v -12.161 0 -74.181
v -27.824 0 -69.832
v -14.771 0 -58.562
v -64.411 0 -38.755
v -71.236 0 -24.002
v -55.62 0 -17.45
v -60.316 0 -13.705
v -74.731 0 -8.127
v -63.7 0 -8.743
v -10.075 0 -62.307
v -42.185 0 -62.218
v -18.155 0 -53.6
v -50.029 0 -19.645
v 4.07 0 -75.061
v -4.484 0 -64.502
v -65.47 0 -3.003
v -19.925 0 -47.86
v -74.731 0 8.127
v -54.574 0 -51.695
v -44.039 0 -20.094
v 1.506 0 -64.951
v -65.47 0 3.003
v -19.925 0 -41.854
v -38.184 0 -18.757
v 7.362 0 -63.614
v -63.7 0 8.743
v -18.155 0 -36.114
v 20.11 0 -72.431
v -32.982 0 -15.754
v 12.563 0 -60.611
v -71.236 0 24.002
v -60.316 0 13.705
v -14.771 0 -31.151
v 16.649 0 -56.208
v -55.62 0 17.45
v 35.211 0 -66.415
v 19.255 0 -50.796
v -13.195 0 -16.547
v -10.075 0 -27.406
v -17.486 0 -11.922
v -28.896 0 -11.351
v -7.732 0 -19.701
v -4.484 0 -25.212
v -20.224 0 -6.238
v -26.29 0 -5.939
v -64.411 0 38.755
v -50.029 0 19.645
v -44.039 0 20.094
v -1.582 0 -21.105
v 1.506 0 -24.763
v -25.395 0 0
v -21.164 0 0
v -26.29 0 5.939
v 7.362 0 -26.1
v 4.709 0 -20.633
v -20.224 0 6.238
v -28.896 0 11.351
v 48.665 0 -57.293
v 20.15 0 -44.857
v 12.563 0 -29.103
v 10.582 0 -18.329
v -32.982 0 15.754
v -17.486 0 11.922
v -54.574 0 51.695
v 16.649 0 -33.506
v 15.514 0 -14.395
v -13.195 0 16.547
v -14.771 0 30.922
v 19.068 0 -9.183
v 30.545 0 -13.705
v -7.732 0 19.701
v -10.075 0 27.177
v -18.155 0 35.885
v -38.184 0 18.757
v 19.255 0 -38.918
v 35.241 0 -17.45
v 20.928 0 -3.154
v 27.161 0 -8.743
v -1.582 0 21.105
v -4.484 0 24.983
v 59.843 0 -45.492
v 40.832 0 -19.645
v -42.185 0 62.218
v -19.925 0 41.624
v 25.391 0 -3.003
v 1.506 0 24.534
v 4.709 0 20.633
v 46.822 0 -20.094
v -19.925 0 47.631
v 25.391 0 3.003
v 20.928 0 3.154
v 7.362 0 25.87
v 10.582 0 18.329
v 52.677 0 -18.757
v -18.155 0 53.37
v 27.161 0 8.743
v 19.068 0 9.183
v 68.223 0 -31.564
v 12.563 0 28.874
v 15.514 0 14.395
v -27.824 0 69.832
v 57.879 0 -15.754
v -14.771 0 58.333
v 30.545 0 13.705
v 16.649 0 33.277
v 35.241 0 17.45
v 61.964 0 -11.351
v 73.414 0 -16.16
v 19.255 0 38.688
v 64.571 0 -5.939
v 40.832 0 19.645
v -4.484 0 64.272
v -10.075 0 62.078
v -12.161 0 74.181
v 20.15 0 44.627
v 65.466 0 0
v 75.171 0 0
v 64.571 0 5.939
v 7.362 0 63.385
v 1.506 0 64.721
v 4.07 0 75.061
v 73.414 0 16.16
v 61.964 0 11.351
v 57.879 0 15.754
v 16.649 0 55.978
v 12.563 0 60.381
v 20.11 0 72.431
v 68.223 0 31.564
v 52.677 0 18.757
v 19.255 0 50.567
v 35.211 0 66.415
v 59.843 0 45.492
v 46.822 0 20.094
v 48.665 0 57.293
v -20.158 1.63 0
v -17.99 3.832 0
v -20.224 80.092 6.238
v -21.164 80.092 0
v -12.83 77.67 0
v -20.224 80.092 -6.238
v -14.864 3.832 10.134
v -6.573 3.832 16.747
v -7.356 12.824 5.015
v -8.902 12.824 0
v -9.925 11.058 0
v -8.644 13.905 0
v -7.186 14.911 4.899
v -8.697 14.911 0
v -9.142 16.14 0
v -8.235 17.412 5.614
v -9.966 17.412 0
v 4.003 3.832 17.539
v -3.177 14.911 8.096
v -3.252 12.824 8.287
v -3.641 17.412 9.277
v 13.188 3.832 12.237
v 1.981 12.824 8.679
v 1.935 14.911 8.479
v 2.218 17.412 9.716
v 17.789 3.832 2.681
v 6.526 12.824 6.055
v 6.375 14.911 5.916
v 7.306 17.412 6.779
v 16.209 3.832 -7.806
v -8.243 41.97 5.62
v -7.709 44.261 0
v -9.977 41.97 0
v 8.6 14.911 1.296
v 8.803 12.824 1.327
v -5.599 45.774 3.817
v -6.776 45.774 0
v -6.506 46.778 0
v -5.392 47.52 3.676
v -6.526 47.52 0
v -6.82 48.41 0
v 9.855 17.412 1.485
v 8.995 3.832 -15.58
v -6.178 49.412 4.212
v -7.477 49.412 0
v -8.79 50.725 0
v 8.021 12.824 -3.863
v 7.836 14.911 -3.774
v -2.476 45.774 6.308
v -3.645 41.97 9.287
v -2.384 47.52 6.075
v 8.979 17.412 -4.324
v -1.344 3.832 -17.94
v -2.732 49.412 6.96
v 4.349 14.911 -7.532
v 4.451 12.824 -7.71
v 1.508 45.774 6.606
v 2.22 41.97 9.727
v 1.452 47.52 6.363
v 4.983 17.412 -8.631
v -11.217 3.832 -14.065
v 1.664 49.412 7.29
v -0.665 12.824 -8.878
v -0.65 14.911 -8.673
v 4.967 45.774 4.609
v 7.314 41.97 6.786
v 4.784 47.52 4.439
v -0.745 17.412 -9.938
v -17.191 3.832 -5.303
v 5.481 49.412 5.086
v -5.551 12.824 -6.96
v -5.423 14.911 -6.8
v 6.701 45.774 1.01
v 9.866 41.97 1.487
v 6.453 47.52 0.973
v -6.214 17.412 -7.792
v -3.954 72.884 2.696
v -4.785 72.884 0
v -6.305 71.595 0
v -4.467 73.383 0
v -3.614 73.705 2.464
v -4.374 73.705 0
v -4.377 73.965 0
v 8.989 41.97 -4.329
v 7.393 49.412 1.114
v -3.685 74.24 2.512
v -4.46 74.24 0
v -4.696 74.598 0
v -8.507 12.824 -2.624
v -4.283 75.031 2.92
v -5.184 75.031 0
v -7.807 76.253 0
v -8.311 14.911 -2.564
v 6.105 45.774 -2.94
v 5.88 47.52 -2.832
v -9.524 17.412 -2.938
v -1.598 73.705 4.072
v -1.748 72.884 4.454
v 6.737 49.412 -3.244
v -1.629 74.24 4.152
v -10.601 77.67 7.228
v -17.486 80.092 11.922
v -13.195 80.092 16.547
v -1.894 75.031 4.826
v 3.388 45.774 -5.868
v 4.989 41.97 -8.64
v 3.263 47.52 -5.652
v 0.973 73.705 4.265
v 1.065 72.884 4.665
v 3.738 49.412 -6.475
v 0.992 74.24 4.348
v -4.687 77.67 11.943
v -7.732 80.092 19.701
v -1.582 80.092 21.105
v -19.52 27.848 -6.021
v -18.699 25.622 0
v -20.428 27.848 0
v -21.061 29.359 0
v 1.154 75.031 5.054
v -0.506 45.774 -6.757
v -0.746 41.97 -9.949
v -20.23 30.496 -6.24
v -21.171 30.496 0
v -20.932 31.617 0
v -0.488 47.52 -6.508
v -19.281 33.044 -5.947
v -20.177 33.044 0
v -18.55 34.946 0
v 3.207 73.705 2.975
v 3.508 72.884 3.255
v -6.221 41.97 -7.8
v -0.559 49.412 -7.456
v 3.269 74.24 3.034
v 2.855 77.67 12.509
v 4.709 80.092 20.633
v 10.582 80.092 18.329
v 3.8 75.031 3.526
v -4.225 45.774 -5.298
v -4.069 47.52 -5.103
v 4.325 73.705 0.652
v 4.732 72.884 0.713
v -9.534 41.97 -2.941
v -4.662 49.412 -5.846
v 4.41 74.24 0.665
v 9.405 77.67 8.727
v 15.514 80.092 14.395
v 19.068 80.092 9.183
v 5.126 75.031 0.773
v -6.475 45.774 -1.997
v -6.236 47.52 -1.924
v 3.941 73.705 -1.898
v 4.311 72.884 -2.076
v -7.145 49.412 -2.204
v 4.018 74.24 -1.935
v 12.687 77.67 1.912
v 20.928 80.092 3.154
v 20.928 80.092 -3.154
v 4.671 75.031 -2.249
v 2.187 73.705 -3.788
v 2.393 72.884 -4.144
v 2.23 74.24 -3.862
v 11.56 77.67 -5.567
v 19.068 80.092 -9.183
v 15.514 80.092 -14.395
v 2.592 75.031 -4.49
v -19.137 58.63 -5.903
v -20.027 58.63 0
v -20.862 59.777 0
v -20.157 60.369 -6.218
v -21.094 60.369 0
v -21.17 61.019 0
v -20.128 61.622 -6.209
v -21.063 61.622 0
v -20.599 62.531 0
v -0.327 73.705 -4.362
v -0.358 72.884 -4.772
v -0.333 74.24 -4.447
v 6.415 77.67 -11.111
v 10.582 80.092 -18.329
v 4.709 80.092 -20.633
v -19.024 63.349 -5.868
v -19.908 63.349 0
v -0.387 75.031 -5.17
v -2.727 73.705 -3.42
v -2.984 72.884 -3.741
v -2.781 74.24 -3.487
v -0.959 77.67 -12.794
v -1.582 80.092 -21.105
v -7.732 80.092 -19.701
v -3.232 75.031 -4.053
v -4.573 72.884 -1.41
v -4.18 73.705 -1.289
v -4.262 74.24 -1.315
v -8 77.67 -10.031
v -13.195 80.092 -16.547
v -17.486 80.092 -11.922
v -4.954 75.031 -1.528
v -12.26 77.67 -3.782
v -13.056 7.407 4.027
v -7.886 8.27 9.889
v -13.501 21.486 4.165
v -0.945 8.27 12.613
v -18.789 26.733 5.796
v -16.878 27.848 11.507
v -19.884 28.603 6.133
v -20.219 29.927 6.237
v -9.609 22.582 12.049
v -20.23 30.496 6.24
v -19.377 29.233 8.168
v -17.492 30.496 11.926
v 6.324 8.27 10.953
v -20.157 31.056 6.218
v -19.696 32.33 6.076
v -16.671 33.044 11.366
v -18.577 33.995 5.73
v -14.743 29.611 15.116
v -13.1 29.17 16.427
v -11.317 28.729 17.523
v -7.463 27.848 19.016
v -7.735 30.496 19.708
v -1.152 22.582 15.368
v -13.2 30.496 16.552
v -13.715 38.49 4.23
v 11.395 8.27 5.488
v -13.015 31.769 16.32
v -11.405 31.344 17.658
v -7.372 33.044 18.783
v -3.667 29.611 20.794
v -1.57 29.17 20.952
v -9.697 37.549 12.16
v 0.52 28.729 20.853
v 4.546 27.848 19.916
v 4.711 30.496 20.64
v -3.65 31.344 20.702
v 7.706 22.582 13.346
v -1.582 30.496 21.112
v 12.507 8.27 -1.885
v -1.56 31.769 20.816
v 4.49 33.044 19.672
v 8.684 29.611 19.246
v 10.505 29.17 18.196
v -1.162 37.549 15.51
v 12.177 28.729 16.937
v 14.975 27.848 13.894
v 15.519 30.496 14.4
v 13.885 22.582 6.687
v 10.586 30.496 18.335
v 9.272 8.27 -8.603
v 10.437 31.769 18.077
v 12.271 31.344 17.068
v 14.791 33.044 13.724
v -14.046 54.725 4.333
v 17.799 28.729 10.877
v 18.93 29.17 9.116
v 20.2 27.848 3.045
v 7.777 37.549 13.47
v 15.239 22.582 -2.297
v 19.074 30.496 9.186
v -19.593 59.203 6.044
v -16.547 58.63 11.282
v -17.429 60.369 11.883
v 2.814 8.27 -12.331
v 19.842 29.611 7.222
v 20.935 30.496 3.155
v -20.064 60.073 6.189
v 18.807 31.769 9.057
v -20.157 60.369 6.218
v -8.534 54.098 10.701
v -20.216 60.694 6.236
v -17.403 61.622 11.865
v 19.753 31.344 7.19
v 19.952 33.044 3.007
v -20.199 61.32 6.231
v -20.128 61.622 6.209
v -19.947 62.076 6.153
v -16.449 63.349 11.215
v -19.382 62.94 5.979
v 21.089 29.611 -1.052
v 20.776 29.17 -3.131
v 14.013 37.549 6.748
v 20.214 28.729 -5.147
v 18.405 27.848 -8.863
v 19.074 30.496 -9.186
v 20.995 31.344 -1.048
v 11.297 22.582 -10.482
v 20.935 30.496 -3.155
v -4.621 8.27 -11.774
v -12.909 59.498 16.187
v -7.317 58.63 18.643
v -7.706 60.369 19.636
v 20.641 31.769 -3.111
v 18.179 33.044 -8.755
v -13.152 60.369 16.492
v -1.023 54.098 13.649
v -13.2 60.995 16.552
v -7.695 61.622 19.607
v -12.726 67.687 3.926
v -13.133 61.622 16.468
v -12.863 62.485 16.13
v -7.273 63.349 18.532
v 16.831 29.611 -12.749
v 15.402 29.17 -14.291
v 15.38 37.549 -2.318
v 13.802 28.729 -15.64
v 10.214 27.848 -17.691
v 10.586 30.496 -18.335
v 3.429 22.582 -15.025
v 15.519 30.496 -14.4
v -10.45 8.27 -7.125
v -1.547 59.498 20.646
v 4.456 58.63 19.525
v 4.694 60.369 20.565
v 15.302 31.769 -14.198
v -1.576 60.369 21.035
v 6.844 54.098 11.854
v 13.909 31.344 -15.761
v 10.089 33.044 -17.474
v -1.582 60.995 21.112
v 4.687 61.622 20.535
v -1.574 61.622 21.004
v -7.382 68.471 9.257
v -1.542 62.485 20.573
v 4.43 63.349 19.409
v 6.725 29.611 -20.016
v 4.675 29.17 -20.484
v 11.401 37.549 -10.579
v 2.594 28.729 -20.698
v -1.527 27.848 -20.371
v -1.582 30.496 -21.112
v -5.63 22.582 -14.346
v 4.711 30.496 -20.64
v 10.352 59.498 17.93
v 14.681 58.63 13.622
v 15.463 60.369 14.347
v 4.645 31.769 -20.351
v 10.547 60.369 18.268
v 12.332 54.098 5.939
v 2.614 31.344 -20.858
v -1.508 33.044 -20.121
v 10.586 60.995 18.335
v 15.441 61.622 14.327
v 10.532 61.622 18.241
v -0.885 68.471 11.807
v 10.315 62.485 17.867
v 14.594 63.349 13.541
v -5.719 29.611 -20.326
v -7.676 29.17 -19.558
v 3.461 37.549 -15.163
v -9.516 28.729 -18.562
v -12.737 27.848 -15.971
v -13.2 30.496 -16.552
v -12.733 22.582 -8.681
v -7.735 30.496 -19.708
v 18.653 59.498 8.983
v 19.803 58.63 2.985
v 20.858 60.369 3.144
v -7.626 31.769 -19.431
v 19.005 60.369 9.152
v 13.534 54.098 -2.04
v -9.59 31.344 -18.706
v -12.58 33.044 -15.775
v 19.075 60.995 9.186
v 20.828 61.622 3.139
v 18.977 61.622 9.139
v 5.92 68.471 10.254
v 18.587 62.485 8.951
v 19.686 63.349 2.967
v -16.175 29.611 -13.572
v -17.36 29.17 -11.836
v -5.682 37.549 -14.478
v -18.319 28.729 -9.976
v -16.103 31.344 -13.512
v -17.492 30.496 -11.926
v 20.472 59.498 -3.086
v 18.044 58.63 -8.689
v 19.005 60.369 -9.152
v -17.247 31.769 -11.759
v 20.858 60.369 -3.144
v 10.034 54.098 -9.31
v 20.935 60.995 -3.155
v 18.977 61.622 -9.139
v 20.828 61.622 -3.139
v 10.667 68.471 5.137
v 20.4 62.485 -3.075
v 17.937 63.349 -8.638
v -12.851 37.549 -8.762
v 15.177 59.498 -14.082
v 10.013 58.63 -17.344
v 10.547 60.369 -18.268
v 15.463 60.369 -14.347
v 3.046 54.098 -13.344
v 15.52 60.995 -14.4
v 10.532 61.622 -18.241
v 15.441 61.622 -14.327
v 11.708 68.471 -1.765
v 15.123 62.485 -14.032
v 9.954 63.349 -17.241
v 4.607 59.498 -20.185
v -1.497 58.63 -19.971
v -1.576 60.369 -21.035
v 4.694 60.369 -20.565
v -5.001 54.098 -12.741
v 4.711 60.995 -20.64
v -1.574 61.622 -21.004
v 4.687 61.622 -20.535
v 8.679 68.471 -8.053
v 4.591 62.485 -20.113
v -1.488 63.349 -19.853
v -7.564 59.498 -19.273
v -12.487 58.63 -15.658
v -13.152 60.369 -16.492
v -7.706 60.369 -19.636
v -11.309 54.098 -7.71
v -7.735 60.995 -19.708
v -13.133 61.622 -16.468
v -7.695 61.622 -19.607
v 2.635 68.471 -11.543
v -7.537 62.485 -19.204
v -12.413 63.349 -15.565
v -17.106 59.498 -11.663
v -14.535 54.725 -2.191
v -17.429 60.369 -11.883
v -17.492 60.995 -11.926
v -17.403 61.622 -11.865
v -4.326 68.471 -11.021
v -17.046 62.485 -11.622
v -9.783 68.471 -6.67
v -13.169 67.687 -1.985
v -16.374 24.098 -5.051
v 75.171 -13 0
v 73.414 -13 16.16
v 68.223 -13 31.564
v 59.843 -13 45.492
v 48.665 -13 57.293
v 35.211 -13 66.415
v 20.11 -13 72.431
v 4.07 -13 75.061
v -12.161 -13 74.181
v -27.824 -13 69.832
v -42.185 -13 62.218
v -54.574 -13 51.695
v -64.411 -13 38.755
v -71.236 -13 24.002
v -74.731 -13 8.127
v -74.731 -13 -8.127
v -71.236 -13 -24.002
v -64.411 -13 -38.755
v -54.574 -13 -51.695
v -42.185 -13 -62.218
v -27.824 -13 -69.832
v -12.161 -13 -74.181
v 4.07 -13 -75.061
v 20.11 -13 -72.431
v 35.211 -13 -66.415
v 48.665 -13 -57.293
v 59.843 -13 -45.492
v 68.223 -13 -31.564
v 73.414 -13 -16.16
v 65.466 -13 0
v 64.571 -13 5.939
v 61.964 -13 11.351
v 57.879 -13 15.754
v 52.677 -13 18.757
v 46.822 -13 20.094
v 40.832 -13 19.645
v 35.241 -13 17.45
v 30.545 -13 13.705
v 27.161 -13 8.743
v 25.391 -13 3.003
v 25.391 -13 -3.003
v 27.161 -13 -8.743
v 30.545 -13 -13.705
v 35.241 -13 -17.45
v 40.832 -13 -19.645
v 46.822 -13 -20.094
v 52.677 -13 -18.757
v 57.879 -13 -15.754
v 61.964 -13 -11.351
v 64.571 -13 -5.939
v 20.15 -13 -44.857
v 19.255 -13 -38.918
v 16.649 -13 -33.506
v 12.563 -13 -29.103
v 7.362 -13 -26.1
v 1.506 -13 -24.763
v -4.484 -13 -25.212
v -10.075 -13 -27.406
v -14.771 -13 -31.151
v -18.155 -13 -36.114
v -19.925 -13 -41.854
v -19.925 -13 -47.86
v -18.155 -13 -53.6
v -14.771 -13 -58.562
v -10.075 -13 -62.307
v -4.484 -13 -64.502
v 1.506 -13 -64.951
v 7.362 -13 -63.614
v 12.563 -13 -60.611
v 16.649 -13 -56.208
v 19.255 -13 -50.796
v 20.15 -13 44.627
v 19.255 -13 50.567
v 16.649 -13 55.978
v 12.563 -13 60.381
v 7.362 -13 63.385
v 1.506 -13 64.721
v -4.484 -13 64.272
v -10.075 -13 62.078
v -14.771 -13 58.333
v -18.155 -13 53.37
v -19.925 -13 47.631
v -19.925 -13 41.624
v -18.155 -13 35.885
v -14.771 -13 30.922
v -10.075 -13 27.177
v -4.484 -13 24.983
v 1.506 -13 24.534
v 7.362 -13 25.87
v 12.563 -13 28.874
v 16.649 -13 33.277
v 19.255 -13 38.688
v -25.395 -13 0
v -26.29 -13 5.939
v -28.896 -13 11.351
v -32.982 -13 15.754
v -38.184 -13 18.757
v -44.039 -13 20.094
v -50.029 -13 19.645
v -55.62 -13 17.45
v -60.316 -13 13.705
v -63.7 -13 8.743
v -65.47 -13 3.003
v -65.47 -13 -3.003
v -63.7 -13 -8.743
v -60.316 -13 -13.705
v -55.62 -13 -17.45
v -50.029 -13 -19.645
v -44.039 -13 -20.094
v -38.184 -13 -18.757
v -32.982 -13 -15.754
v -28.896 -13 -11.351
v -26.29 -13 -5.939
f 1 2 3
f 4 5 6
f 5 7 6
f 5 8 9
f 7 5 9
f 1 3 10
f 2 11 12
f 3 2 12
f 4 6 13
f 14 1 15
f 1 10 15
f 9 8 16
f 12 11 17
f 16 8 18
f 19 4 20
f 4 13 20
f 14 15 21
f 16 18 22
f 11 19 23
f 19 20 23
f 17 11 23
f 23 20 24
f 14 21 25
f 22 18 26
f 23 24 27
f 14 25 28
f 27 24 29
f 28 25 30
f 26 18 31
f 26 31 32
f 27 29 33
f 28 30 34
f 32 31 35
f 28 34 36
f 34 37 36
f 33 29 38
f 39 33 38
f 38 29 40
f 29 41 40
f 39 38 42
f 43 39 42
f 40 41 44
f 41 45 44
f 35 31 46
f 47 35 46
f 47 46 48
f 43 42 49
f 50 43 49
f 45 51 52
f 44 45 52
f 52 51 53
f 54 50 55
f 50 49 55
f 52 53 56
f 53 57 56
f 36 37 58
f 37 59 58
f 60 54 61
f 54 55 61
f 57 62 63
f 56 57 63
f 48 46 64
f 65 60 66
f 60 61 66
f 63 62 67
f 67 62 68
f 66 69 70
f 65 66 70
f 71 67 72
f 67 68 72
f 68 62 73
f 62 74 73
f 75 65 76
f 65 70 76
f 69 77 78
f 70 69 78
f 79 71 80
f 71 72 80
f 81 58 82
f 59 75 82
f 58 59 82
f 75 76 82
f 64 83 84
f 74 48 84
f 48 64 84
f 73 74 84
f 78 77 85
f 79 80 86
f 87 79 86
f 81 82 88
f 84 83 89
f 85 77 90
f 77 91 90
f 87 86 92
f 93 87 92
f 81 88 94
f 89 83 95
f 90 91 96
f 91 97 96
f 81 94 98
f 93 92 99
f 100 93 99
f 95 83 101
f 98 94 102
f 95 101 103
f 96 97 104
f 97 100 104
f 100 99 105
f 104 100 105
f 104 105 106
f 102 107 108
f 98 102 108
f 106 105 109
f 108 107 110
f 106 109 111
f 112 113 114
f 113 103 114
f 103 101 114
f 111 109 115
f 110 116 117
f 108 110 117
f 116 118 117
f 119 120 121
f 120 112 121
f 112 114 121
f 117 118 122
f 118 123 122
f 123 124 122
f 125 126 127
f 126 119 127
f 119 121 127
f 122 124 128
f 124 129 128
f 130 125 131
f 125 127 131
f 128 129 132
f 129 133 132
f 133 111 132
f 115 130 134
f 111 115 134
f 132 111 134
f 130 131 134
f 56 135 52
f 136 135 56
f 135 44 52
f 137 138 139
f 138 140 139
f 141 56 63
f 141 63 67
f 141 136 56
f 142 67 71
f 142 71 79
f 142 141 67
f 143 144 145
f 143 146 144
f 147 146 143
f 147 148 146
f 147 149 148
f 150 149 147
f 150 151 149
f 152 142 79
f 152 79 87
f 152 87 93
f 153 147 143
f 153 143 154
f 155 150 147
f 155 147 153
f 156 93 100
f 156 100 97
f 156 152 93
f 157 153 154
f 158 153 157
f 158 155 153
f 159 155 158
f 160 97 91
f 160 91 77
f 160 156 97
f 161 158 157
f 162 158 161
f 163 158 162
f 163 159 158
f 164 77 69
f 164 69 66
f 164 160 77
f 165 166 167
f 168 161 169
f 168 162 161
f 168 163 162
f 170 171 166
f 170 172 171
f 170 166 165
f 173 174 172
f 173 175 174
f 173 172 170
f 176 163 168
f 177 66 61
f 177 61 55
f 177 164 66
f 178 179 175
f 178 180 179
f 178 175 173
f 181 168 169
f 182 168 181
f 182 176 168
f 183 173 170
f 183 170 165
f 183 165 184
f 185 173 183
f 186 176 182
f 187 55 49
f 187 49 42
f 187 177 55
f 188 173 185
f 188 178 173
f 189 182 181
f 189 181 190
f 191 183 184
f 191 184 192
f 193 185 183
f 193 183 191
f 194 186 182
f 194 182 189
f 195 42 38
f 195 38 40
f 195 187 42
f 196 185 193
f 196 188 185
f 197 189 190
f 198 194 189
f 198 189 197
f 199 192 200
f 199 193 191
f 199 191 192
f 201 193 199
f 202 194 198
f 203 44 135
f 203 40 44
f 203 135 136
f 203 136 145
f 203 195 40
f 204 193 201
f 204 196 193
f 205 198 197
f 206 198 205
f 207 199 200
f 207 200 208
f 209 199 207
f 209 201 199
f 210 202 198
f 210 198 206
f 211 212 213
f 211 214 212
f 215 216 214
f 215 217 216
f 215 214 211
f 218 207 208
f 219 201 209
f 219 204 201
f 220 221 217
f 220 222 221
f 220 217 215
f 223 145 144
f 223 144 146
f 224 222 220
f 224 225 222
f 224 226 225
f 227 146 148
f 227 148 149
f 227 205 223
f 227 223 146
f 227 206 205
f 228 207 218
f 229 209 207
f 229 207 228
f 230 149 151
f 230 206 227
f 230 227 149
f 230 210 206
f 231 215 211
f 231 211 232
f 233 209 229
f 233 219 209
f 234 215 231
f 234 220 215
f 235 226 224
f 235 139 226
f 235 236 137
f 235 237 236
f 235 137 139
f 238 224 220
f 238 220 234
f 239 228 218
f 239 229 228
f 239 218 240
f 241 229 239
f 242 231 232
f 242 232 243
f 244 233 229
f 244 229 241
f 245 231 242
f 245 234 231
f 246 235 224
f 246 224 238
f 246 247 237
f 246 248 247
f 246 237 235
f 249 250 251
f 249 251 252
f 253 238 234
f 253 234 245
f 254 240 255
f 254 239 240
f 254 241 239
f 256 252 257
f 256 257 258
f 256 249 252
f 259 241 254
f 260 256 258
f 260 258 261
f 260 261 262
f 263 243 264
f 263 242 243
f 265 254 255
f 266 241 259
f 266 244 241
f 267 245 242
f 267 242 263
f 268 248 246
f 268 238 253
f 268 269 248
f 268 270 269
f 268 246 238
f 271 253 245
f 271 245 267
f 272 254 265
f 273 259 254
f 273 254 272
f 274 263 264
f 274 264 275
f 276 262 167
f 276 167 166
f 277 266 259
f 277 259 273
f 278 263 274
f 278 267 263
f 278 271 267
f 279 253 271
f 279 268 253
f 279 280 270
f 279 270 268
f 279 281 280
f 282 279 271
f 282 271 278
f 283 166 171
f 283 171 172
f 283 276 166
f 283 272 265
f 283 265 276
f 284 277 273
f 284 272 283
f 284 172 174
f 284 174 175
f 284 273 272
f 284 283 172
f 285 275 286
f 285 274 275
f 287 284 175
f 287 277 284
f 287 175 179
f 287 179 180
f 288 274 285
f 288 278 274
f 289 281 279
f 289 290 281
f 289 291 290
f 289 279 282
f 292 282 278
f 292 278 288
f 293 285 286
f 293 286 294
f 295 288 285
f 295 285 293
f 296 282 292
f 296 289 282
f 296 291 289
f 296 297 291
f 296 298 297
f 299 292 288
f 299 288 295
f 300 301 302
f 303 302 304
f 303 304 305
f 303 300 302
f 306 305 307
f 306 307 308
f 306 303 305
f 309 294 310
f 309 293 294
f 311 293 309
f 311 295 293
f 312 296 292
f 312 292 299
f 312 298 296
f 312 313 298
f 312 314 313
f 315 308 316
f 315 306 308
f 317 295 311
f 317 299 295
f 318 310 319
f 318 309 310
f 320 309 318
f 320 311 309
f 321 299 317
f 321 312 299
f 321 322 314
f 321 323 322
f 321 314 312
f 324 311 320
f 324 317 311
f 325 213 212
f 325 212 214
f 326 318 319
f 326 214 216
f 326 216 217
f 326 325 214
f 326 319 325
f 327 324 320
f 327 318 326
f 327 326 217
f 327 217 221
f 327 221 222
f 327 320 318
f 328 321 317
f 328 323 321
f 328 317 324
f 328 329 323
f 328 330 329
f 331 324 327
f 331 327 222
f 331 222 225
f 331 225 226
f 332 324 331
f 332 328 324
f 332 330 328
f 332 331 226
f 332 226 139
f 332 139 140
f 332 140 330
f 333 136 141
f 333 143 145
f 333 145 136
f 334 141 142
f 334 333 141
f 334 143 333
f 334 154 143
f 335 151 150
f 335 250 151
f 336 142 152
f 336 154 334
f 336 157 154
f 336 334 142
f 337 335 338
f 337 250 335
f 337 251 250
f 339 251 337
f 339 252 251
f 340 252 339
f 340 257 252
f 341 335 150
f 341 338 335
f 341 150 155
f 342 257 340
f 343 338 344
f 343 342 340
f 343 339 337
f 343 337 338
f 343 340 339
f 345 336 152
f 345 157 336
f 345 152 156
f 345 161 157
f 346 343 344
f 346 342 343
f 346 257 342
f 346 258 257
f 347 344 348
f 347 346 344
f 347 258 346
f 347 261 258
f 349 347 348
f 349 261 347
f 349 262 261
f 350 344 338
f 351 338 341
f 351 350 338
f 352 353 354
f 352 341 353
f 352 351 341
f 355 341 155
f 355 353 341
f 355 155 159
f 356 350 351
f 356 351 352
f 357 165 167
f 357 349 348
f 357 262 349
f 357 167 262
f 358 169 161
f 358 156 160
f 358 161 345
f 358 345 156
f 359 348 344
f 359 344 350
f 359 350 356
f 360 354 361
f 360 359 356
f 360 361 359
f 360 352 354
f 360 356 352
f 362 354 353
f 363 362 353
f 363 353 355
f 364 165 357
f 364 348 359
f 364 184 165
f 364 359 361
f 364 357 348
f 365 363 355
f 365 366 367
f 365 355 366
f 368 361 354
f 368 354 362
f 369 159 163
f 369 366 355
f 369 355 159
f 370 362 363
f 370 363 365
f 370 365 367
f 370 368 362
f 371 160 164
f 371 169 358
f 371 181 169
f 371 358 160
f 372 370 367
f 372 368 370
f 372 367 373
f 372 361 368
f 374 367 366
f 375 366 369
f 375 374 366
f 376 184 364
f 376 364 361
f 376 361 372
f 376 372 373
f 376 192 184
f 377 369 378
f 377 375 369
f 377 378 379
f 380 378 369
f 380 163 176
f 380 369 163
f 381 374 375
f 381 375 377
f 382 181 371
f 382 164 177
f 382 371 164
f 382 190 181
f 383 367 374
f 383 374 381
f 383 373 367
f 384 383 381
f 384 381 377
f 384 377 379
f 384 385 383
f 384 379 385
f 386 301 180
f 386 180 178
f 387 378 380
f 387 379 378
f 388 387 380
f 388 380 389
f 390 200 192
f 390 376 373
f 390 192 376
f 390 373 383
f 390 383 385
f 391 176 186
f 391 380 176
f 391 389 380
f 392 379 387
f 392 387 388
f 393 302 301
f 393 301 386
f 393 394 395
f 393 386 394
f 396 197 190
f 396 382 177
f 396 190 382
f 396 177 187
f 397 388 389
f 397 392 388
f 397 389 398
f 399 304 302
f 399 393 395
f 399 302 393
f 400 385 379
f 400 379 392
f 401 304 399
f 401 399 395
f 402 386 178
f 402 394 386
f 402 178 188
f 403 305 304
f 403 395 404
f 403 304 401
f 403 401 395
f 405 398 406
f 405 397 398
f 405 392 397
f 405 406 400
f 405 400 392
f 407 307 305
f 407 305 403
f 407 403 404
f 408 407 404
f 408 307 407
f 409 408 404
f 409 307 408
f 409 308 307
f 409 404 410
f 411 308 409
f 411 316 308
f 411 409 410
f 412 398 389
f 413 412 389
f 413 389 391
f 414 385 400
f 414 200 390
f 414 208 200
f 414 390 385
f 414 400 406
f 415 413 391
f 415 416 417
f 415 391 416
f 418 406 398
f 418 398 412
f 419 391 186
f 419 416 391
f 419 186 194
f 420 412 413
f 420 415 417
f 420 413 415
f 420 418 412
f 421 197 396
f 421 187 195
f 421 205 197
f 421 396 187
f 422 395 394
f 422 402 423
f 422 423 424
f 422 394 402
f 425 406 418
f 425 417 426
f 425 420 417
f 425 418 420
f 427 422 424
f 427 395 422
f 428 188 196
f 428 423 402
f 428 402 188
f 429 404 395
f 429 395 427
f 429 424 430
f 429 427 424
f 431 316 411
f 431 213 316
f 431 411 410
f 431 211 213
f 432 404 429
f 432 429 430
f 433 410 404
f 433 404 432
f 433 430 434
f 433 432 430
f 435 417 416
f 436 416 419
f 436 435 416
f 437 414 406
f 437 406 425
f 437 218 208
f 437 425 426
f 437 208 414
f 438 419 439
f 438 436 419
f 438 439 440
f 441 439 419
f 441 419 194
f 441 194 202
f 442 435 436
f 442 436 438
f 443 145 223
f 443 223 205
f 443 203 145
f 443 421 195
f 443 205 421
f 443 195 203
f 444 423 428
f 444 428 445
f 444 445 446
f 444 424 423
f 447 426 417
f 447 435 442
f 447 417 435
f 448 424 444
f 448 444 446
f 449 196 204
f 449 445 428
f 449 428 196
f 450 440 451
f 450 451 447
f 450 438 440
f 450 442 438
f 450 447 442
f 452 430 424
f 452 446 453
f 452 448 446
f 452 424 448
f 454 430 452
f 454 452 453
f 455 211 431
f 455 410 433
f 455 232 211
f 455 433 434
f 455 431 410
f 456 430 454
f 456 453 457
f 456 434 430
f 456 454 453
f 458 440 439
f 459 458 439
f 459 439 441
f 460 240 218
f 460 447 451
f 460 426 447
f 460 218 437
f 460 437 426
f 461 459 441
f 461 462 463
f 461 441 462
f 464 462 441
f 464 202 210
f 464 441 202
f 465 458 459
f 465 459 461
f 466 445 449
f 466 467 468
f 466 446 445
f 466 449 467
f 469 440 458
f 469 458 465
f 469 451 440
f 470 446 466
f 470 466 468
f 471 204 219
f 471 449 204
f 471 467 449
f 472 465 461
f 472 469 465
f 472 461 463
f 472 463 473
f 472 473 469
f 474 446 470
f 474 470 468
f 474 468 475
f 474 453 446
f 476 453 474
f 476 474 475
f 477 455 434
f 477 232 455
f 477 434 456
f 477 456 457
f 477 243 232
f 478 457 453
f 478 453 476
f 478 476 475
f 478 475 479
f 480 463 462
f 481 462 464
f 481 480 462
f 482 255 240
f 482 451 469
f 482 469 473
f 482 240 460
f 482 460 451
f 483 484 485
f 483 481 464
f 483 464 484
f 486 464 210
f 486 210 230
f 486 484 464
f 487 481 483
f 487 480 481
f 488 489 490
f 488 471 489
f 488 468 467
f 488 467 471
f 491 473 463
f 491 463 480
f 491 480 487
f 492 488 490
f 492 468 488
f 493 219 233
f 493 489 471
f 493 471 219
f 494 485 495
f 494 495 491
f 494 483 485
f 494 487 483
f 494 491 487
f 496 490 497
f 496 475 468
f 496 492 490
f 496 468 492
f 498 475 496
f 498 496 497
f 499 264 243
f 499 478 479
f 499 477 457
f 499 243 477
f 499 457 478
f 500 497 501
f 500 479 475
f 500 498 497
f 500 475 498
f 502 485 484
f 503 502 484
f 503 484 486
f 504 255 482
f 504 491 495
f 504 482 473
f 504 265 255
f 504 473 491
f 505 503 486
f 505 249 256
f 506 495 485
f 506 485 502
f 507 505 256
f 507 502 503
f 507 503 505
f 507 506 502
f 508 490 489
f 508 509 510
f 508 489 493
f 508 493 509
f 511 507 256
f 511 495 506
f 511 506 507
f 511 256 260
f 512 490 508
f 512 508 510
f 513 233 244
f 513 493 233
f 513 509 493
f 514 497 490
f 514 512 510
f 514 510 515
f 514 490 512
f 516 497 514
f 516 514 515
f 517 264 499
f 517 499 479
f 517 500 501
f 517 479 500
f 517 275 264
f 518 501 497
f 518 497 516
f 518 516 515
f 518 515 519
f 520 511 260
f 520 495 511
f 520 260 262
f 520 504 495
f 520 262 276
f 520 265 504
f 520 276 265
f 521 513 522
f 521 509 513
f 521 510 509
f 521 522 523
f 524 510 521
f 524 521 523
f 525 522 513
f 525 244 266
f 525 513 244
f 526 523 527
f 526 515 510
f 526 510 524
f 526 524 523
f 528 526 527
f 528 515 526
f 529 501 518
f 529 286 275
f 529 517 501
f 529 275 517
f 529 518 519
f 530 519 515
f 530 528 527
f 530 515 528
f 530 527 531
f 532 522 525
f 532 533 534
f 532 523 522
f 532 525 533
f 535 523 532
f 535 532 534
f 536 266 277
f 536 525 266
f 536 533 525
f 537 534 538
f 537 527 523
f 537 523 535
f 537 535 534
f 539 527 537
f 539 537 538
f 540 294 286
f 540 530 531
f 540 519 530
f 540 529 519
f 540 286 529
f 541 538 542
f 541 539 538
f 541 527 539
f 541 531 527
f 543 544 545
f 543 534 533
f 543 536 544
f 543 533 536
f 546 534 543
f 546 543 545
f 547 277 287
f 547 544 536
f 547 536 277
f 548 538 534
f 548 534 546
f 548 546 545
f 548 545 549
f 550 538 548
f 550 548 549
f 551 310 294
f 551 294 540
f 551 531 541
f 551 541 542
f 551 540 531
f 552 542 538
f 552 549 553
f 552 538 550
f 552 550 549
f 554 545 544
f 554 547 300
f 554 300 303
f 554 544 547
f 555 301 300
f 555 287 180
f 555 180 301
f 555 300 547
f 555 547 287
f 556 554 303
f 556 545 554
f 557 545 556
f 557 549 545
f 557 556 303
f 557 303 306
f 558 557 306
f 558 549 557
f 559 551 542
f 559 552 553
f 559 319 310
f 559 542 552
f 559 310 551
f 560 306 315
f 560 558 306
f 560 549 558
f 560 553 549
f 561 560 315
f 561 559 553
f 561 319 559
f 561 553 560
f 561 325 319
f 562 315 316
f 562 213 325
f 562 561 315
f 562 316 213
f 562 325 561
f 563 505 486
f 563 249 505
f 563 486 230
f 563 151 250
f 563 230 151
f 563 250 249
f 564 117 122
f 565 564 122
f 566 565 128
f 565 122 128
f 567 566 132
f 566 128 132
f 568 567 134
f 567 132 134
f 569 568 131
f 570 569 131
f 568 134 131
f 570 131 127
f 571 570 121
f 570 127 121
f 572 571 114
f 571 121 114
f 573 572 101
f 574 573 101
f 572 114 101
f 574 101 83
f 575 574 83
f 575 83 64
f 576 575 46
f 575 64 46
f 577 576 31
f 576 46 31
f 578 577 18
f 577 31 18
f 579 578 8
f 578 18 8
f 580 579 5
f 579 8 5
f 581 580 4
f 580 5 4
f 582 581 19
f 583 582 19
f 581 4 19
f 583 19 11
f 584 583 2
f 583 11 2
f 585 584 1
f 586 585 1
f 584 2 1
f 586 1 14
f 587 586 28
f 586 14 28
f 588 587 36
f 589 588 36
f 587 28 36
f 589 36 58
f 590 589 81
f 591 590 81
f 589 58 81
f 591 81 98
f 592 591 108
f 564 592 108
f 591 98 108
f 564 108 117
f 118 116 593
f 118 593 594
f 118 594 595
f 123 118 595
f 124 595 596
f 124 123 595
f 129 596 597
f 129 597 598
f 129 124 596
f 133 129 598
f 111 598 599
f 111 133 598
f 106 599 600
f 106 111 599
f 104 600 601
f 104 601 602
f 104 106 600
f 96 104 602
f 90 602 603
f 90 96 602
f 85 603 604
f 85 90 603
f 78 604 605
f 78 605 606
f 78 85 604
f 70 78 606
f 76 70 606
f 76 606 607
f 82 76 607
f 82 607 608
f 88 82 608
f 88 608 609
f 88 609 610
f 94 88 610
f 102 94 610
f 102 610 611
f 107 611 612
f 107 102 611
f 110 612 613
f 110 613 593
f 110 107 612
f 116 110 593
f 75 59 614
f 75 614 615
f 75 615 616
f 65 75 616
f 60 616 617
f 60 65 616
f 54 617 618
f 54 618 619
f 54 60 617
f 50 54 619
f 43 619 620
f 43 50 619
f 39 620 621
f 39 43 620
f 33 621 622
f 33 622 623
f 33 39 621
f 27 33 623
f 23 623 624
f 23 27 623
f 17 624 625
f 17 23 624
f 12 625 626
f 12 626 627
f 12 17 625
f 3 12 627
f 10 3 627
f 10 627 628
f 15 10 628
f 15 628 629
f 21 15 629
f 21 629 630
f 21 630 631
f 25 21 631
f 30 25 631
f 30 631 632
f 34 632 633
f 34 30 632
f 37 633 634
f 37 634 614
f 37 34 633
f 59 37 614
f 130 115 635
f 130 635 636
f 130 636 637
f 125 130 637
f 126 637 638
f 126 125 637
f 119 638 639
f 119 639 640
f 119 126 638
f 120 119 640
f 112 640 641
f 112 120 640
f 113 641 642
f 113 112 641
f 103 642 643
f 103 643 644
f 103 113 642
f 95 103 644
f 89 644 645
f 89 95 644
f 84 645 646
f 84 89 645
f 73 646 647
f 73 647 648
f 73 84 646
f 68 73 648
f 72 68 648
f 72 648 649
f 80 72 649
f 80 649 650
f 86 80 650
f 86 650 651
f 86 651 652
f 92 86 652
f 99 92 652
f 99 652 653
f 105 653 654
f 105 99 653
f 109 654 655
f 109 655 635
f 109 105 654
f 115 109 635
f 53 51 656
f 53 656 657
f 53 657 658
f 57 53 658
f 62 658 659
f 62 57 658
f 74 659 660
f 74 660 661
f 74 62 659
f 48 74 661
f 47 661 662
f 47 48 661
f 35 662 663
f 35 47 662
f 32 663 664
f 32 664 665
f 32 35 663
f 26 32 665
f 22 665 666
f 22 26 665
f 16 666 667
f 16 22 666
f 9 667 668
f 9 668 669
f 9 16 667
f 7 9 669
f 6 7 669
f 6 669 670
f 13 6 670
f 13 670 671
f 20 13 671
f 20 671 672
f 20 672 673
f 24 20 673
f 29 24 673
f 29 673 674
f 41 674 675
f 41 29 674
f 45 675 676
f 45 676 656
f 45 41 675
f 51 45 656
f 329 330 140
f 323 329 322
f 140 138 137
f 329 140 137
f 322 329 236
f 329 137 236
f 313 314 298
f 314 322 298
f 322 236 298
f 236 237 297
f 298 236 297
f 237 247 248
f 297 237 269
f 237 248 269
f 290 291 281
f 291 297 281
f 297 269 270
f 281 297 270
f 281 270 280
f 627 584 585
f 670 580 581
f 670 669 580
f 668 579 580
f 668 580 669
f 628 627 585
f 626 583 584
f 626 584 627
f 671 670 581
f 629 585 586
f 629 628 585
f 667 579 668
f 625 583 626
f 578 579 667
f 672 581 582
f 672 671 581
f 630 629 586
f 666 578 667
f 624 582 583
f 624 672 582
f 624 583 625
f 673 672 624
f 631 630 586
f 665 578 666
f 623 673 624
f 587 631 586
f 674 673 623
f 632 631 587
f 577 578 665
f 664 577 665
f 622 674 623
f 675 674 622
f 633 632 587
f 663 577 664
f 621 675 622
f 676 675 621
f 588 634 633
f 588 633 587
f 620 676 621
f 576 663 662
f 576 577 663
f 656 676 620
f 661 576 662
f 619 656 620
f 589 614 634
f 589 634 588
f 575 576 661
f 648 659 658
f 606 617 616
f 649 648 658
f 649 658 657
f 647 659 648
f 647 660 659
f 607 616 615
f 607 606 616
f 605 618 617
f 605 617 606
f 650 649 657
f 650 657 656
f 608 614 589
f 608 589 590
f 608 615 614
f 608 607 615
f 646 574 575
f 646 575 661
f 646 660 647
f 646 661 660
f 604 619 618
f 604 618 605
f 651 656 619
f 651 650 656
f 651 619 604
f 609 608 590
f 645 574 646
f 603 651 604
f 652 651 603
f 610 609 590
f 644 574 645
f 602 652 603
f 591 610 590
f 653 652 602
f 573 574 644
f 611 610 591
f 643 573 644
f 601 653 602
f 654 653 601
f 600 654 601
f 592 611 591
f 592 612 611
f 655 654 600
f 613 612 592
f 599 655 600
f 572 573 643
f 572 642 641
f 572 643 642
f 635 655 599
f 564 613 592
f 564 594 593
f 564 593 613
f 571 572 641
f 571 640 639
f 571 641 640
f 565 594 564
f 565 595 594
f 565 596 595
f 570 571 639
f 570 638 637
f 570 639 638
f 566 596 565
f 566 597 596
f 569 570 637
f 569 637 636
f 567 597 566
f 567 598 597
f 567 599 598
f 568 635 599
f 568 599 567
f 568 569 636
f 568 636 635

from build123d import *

# Parameters (mm, degrees)
F0_R     = 75.1711608748
F0_R_2   = 20.15
F1_DEPTH = 13


# Not quite as in the source:
# - a feature names something its author has since deleted; it is built from what else it names
# - the program builds the solid bodies; features that only make, move or delete a surface that nothing else refers to are left out


with BuildPart() as f1:
    # F0 (on Front) → F1 (new body)
    with BuildSketch(Plane.XZ):
        Circle(F0_R)
        with Locations((0, -44.8568575084)):
            Circle(F0_R_2, mode=Mode.SUBTRACT)
        with Locations((-45.5452017486, 0)):
            Circle(F0_R_2, mode=Mode.SUBTRACT)
        with Locations((45.3157536685, 0)):
            Circle(F0_R_2, mode=Mode.SUBTRACT)
        with Locations((0, 44.6274131536)):
            Circle(F0_R_2, mode=Mode.SUBTRACT)
    extrude(amount=F1_DEPTH)

    # F2 (on Top) → F3 (revolve)
    with BuildSketch(Plane.XY):
        with BuildLine():
            Line((-21.1639329791, 0), (0, 0))
            Line((0, 0), (0, 80.0915658474))
            Line((0, 80.0915658474), (-21.1639329791, 80.0915658474))
            add(Edge.make_bspline(
                [(-21.1639329791, 0), (-19.2742553322, 4.6189694115), (3.1468380819, 14.4620732239), (-34.8000145769, 30.7354101763), (8.134922476, 47.7855342492), (-36.319607523, 61.0135638885), (9.834598536, 75.0191615104), (-16.6499702233, 77.9874063736), (-21.1639329791, 80.0915658474)],
                knots=[0, 0, 0, 0, 0.1626396624, 0.3304383742, 0.5058929878, 0.6723966985, 0.8424869218, 1, 1, 1, 1], degree=3))
        make_face()
    revolve(axis=Axis((0, 40.0457829237, 0), (0, 1, 0)))


solid = f1.part
